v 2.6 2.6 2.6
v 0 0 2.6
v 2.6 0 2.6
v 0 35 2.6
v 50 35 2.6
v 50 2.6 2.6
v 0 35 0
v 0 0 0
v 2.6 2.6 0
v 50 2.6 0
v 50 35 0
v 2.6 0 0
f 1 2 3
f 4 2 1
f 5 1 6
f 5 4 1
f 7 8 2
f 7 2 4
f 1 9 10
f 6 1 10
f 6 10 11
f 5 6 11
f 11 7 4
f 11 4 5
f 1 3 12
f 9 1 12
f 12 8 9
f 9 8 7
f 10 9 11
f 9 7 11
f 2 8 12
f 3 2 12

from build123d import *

# Parameters (mm, degrees)
SKETCH1_W           = 50
SKETCH1_H           = 35
BOSS_EXTRUDE1_DEPTH = 2.6
CAVITY1_OUTLINE_W   = 47.4
CAVITY1_OUTLINE_H   = 2.6
CAVITY1_DEPTH       = 2.6


# Read off the part's stored shape, not the designer's step: Cavity1
with BuildPart() as part:
    # Sketch1 → Boss-Extrude1 (new body)
    with BuildSketch(Plane.XY):
        with Locations((25, 17.5)):
            Rectangle(SKETCH1_W, SKETCH1_H)
    extrude(amount=BOSS_EXTRUDE1_DEPTH)

    # Cavity1 outline → Cavity1 (cut)
    with BuildSketch(Plane(origin=(0, 0, 0), x_dir=(1, 0, 0), z_dir=(0, 1, 0))):
        with Locations((26.3, -1.3)):
            Rectangle(CAVITY1_OUTLINE_W, CAVITY1_OUTLINE_H)
    extrude(amount=CAVITY1_DEPTH, mode=Mode.SUBTRACT)


solid = part.part
